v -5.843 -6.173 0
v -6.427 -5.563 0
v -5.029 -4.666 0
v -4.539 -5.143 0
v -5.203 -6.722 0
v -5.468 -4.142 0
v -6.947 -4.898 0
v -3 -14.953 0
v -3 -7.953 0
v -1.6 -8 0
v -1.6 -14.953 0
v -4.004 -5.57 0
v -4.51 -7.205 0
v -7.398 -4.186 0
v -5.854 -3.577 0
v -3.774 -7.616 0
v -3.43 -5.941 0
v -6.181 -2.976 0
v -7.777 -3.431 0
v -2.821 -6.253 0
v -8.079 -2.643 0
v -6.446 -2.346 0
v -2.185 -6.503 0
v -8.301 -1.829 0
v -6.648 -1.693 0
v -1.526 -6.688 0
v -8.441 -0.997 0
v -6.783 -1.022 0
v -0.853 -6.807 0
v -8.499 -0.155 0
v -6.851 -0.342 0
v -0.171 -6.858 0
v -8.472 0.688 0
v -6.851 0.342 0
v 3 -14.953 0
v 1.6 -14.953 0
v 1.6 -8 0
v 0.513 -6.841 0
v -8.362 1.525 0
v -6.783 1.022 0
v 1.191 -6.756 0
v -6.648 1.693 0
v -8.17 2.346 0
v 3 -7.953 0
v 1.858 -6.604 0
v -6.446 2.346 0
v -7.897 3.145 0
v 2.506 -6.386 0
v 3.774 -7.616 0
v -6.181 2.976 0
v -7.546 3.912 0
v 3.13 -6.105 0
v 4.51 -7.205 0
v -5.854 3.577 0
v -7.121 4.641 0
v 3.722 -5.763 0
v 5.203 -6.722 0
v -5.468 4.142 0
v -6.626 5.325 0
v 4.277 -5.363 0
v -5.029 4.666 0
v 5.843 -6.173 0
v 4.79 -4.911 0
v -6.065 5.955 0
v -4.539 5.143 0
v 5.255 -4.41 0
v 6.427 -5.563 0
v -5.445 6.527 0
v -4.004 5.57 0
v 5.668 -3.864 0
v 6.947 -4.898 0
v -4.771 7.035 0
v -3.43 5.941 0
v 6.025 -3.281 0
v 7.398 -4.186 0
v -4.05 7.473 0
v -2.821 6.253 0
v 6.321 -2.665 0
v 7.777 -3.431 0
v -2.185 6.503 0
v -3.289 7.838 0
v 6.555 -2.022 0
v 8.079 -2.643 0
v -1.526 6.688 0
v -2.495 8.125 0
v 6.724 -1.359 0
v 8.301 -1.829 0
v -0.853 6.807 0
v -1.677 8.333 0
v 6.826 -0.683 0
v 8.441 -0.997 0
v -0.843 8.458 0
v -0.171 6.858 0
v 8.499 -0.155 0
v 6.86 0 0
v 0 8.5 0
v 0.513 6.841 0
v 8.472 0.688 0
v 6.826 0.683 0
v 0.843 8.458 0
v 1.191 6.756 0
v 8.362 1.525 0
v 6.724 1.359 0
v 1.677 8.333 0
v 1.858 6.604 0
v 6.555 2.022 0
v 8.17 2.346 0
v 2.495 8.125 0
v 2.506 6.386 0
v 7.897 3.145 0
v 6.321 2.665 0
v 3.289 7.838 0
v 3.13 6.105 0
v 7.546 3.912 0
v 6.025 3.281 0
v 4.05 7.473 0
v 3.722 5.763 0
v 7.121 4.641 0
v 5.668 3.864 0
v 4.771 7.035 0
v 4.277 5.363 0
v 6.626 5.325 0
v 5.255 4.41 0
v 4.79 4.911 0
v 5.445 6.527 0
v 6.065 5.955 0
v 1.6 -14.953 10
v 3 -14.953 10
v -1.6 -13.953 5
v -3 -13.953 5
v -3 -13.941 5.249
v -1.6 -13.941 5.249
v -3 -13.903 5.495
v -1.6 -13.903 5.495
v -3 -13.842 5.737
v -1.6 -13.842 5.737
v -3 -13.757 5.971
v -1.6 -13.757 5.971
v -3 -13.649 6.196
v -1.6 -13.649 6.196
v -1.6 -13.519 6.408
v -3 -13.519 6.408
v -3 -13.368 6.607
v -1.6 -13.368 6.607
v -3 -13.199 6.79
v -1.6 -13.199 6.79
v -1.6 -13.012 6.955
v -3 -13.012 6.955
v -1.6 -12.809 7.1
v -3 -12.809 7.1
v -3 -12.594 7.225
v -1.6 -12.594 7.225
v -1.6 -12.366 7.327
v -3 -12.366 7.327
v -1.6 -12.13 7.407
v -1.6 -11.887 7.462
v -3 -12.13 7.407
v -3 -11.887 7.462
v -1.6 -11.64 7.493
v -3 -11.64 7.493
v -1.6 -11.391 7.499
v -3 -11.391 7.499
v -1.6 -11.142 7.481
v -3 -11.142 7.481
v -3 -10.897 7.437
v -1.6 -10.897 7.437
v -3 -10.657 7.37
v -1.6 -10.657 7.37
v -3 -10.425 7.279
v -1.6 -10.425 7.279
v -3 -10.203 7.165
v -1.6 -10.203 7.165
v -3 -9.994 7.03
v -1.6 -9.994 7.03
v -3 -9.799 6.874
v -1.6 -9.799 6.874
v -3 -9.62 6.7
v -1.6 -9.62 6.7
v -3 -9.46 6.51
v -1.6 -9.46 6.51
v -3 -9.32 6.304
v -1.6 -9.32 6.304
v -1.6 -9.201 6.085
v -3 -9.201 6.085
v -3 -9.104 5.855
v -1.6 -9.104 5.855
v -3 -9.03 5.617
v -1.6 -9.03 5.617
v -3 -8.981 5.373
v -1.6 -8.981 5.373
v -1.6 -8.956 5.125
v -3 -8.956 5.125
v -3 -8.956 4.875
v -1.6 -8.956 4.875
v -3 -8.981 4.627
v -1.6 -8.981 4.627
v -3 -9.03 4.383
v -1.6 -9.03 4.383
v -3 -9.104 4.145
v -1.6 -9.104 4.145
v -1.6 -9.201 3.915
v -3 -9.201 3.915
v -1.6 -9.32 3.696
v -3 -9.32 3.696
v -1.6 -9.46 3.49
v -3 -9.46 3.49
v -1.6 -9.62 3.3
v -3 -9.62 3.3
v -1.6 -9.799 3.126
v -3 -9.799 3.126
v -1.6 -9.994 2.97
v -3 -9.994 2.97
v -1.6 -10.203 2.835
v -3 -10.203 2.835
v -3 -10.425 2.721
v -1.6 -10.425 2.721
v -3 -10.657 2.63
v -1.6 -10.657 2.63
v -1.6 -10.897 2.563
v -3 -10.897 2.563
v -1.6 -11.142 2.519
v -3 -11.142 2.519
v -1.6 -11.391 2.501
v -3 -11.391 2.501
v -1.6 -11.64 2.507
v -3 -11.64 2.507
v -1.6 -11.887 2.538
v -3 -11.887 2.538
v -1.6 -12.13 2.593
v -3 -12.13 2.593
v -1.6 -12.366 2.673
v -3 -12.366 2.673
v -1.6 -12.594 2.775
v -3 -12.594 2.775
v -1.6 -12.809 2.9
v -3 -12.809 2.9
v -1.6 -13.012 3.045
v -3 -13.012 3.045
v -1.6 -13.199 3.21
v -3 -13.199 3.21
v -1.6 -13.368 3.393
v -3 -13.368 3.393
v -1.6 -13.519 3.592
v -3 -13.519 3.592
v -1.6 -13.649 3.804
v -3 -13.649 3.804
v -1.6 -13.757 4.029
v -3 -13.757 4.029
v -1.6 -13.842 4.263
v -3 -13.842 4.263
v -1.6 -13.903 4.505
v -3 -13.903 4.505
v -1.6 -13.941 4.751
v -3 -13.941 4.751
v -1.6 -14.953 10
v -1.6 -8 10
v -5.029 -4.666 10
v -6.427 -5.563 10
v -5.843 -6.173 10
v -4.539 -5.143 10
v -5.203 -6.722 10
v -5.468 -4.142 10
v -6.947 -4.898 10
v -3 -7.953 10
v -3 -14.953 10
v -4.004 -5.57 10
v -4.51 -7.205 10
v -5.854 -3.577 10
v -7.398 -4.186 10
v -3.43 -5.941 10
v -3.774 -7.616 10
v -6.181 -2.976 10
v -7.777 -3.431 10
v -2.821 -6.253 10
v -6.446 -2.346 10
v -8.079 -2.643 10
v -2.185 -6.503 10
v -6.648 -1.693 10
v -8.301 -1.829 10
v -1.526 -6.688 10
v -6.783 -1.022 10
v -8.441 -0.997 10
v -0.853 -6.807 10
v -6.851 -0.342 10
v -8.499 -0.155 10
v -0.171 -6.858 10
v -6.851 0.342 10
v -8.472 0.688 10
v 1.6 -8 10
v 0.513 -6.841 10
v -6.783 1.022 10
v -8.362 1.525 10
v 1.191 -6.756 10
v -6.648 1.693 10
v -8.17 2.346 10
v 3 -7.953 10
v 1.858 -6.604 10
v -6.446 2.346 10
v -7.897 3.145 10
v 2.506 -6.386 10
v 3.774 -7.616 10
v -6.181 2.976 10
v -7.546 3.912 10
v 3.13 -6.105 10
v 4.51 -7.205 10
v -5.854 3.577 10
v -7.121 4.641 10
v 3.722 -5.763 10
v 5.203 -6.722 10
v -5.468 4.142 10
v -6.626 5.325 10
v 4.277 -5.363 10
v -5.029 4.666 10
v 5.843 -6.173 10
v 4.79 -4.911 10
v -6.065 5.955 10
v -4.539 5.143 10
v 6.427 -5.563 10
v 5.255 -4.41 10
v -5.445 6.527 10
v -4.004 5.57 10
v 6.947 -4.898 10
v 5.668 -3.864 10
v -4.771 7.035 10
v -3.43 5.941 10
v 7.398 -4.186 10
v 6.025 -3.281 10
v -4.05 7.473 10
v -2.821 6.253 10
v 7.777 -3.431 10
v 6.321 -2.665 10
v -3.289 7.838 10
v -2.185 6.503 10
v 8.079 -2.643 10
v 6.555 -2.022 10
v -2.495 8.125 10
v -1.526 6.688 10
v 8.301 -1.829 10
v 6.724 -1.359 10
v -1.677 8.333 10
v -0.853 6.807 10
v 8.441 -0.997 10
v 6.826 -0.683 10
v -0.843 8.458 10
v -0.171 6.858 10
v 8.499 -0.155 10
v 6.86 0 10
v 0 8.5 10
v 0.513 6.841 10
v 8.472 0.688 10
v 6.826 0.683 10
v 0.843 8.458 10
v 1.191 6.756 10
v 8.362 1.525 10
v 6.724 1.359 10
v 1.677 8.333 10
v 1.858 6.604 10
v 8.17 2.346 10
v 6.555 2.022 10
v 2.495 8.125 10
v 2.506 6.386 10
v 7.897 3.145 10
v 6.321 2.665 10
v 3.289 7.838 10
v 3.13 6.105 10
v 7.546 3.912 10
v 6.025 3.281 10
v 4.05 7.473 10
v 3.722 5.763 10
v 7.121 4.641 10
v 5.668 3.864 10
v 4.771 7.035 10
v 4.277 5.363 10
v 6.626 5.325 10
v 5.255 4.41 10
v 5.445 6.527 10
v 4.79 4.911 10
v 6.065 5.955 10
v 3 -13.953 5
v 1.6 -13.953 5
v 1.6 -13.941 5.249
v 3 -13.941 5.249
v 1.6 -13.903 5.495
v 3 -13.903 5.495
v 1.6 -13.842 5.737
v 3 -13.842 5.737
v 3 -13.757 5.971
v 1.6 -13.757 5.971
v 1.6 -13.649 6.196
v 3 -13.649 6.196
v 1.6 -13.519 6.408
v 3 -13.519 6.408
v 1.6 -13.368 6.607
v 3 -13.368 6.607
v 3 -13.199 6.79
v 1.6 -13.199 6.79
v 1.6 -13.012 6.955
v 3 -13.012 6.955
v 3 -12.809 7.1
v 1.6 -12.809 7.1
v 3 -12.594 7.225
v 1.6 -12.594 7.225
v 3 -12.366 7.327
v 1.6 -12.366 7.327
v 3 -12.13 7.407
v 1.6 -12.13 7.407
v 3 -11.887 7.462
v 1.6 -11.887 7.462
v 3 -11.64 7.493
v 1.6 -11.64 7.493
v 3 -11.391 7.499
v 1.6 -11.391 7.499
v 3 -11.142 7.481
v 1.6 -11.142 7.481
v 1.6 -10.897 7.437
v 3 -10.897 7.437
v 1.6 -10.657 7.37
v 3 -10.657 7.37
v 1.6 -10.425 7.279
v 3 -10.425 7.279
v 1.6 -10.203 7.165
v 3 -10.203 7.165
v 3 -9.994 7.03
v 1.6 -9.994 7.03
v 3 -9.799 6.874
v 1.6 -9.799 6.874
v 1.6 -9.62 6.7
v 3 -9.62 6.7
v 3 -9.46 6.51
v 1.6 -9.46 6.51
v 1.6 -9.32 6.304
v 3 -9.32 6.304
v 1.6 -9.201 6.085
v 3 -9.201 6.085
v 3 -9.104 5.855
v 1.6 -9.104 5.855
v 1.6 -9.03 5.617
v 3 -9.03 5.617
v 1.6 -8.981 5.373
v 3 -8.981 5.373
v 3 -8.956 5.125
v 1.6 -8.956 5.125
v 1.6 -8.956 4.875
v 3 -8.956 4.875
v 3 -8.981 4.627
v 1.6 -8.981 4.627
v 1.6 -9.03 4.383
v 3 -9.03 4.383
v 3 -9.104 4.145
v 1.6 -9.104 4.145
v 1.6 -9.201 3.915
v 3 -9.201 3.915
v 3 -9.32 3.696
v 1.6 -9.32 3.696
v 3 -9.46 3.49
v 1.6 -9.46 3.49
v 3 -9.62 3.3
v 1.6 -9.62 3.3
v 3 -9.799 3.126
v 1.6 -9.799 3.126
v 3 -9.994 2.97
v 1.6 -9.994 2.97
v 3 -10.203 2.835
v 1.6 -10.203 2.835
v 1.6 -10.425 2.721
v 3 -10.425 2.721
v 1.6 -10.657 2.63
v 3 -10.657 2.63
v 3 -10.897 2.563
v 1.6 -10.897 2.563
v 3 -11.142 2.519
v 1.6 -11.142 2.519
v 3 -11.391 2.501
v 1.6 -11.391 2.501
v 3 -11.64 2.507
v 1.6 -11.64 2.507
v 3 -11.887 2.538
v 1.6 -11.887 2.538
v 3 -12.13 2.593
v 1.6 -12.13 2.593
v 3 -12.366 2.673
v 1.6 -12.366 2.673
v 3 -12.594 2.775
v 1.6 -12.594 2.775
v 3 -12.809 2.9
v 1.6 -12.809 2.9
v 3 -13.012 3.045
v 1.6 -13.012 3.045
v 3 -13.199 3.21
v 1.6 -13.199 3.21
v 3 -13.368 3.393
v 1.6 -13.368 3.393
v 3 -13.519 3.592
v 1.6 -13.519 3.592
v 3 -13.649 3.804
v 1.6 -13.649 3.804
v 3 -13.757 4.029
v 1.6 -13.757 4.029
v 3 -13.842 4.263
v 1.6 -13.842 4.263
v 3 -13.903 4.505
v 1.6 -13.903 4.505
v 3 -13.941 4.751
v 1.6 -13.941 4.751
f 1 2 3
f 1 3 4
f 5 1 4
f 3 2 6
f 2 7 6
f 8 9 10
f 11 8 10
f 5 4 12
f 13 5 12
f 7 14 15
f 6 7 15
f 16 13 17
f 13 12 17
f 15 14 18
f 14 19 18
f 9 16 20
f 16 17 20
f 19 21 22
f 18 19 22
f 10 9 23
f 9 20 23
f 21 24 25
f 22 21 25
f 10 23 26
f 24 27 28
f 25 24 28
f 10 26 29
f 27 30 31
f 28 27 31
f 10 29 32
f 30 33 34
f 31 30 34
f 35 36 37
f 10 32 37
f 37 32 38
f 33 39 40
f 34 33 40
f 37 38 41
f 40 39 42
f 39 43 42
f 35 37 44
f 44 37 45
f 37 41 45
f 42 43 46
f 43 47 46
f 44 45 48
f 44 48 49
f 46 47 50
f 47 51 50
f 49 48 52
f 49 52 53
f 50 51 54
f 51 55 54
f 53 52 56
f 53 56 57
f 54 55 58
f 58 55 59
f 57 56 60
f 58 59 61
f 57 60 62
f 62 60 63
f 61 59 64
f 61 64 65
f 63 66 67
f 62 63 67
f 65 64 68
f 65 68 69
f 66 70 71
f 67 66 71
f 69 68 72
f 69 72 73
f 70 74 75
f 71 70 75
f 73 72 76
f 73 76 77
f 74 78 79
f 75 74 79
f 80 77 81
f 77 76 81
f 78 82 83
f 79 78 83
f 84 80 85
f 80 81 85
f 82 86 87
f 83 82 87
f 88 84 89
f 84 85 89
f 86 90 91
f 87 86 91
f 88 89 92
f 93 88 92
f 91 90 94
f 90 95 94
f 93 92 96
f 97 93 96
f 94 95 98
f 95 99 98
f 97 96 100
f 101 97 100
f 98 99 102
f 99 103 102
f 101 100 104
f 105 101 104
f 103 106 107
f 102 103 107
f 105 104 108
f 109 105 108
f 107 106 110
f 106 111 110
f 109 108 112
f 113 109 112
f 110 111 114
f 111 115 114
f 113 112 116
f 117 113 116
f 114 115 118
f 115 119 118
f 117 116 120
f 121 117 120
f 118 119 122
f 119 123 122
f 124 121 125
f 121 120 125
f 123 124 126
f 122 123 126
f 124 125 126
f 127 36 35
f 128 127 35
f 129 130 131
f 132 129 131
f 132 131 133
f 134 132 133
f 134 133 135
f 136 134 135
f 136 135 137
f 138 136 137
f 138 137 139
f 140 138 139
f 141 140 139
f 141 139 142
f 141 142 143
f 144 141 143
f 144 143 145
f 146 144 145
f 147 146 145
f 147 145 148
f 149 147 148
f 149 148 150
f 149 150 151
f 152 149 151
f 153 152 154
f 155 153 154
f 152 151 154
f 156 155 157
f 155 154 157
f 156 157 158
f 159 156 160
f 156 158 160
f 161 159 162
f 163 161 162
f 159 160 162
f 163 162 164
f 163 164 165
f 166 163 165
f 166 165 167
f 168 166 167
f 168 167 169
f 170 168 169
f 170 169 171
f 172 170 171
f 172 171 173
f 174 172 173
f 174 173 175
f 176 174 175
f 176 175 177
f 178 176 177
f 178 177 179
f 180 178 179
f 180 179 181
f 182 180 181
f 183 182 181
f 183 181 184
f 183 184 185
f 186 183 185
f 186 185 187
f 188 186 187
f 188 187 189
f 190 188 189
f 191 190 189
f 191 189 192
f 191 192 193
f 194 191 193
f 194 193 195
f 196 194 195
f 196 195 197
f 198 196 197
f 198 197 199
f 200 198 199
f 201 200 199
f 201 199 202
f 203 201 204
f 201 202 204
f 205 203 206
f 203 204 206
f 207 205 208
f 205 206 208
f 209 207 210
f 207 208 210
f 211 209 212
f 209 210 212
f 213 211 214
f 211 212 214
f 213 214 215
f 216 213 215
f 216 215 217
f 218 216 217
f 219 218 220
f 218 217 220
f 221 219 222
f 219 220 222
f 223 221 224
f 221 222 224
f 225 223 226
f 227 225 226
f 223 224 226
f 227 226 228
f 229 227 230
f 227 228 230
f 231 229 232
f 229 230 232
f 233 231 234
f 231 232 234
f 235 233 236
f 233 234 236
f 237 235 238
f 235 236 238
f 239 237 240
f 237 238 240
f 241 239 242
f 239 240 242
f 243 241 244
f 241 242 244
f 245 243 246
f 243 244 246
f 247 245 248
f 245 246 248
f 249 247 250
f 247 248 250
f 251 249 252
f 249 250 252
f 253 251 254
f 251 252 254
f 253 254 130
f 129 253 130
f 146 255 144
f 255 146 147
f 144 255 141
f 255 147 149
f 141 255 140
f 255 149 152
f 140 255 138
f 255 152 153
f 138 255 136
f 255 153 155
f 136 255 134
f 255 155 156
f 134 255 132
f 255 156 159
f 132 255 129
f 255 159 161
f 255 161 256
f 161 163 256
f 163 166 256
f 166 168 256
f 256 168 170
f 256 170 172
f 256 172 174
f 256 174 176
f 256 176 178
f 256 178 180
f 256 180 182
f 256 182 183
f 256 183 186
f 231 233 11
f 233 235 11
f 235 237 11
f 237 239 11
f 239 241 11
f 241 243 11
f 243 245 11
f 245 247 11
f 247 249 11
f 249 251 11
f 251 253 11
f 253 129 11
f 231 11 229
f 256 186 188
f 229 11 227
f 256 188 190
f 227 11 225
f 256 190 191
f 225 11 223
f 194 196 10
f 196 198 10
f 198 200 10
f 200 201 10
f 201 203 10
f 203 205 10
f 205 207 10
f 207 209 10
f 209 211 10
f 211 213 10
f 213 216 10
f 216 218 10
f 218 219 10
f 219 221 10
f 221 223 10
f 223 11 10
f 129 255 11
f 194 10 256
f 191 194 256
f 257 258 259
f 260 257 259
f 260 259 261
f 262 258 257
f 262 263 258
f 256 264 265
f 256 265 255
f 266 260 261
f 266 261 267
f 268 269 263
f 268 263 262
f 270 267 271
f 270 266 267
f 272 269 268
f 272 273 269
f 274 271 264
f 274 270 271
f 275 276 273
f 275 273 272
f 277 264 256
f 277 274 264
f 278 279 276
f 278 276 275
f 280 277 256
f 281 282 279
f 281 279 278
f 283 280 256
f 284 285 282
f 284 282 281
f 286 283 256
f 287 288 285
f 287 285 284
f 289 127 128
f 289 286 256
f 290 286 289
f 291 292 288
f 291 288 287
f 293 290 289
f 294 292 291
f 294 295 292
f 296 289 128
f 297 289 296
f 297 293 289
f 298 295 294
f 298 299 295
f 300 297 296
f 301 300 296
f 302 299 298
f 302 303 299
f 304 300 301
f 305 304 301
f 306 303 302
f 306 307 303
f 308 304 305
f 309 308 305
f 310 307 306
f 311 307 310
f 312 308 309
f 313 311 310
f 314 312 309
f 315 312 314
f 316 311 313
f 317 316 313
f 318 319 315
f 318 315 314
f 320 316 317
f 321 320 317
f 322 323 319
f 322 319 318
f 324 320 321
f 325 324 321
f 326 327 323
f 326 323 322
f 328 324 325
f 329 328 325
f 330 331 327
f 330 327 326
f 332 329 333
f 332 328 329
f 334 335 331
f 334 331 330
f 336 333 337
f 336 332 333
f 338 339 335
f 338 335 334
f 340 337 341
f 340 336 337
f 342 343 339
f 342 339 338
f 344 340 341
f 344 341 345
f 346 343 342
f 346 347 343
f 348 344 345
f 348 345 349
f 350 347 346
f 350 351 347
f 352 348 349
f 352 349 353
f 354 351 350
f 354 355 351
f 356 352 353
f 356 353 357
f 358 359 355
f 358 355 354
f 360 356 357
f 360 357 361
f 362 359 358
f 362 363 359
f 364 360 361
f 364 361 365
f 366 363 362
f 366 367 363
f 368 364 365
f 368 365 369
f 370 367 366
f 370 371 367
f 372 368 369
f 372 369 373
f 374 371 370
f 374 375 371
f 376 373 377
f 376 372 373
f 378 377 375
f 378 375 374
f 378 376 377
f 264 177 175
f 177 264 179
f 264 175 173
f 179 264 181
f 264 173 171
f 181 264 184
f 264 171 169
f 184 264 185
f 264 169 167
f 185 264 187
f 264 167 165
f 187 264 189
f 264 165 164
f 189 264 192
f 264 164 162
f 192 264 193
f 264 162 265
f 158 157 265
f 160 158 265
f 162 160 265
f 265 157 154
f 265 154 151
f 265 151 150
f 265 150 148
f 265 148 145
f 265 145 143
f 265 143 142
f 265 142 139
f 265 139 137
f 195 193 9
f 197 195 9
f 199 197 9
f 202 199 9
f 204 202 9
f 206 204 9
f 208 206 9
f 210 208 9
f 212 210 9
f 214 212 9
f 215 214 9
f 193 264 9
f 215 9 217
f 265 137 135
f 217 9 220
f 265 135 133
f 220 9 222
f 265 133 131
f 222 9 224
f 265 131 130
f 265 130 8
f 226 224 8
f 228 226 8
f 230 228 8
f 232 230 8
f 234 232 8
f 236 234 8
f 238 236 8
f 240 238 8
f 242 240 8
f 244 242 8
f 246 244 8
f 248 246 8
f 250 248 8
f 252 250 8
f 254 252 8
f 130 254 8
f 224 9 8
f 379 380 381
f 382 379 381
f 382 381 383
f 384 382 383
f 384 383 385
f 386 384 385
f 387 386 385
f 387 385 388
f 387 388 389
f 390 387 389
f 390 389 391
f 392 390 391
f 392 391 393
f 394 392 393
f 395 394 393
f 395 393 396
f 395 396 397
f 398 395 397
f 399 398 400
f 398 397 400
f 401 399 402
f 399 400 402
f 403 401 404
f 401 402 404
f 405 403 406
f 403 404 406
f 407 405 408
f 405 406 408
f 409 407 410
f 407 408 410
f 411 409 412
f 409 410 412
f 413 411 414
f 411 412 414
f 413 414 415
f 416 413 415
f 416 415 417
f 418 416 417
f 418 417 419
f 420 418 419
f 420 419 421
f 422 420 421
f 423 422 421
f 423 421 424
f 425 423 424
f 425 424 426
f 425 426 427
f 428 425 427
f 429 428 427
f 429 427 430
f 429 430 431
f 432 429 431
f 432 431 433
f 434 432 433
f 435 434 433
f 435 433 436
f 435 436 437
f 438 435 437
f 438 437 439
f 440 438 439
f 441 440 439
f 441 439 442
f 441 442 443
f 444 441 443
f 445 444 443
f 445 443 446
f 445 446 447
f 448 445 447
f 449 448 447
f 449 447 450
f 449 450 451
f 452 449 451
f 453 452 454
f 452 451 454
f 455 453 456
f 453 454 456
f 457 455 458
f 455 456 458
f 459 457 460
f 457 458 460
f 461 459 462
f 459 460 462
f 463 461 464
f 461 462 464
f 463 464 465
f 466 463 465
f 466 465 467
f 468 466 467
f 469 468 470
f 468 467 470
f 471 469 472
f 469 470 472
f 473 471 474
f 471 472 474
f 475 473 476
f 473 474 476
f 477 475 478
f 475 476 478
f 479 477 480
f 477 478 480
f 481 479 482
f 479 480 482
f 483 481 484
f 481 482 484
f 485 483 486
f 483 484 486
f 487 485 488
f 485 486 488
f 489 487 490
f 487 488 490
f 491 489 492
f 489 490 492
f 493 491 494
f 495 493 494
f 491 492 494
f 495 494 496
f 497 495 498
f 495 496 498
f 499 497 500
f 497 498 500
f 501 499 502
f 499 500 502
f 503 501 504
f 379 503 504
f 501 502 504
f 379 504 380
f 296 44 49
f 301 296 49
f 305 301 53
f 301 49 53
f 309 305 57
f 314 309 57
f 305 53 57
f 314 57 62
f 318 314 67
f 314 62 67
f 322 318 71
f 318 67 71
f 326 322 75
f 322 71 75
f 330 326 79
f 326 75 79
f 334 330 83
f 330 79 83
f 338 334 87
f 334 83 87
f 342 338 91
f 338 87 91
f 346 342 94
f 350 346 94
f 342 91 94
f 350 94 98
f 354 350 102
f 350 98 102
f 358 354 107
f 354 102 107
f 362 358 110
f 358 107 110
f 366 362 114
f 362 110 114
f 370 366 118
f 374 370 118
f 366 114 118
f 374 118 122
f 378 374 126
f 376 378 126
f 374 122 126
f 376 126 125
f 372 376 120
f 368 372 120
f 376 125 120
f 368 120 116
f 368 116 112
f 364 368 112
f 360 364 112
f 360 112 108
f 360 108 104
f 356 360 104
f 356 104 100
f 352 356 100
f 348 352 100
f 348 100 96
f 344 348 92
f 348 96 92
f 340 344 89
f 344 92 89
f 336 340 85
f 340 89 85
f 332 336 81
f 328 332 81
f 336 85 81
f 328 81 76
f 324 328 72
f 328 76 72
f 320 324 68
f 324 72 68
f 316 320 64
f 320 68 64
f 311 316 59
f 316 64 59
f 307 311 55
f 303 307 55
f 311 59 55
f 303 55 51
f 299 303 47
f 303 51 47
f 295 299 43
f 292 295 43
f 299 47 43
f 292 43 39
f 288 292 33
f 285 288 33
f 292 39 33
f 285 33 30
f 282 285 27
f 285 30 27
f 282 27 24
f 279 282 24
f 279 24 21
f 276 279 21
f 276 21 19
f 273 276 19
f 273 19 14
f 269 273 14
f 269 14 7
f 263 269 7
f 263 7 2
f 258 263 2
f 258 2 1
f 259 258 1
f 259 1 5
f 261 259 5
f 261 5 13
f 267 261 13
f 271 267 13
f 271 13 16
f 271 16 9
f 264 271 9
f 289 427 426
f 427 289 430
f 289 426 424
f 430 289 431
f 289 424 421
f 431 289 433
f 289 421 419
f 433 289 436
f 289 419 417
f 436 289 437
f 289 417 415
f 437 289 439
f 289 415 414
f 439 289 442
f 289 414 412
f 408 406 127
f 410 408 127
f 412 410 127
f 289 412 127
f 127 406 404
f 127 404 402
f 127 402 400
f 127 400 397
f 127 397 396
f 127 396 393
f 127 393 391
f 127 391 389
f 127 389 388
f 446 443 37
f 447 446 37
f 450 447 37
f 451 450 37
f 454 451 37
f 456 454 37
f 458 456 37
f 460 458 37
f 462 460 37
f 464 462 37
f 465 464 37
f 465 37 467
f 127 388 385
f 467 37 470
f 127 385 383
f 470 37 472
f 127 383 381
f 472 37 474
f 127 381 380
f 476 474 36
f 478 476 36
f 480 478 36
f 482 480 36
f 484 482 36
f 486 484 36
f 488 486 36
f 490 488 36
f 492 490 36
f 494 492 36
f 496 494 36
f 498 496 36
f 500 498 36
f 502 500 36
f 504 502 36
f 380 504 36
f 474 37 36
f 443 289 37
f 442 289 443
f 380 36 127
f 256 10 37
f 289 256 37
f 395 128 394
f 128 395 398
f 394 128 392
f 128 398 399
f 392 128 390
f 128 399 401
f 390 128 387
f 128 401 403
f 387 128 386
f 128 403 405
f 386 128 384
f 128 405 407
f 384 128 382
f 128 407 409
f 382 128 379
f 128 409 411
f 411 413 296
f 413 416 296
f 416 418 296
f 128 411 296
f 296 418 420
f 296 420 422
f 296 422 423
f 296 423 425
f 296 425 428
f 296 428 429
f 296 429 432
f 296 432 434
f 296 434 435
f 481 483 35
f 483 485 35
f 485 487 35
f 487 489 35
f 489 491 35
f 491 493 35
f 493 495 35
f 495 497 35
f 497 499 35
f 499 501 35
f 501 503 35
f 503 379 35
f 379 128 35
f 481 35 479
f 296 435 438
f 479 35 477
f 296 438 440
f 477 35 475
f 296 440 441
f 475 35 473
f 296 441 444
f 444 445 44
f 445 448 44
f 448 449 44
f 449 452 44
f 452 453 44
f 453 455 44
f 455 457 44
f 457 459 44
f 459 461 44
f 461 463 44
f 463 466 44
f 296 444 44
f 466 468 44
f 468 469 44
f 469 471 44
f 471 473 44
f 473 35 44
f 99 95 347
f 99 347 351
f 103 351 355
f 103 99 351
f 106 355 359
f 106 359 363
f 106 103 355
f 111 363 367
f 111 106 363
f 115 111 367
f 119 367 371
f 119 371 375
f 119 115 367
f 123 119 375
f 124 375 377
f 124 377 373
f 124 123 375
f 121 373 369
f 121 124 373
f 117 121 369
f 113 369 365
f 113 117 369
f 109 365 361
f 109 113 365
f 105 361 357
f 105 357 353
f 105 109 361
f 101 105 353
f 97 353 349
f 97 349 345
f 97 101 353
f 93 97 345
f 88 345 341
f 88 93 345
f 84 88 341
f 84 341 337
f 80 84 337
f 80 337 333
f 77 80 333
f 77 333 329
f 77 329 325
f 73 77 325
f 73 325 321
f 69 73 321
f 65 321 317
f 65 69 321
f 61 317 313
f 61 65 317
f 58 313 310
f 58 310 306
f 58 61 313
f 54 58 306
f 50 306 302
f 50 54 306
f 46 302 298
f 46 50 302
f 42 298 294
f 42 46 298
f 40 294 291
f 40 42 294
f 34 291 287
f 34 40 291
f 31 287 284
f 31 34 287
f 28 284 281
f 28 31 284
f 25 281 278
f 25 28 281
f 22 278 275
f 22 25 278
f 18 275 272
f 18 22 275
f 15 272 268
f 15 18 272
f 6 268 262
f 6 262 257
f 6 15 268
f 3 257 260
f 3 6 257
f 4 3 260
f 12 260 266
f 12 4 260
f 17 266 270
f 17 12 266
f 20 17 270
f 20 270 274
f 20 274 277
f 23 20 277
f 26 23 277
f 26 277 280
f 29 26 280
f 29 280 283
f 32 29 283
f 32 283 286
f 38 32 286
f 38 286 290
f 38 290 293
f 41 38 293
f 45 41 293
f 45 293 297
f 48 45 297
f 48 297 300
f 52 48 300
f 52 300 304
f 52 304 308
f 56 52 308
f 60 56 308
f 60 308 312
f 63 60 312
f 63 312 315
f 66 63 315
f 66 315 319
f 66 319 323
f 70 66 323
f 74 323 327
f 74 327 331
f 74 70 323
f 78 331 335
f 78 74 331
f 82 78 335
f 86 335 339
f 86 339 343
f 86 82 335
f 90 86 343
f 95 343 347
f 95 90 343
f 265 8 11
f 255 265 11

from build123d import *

# Parameters (mm, degrees)
F0_R     = 6.86
F1_DEPTH = 10
F2_R     = 2.5
F3_DEPTH = 11.501


with BuildPart() as f1:
    # F0 (on Top) → F1 (new body)
    with BuildSketch(Plane.XY):
        with BuildLine():
            Line((3, -14.952987), (3, -7.952987))
            ThreePointArc((3, -7.952987), (0, 8.5), (-3, -7.952987))
            Line((-3, -7.952987), (-3, -14.952987))
            Line((-3, -14.952987), (-1.6, -14.952987))
            Line((-1.6, -14.952987), (-1.6, -8))
            Line((-1.6, -8), (1.6, -8))
            Line((1.6, -8), (1.6, -14.952987))
            Line((1.6, -14.952987), (3, -14.952987))
        make_face()
        Circle(F0_R, mode=Mode.SUBTRACT)
    extrude(amount=F1_DEPTH)

    # F2 (on face) → F3 (cut, through all)
    with BuildSketch(Plane(origin=(-3, 0, 0), x_dir=(0, -1, 0), z_dir=(-1, 0, 0))):
        with Locations((11.452987, 5)):
            Circle(F2_R)
    extrude(amount=-F3_DEPTH, mode=Mode.SUBTRACT)


solid = f1.part
